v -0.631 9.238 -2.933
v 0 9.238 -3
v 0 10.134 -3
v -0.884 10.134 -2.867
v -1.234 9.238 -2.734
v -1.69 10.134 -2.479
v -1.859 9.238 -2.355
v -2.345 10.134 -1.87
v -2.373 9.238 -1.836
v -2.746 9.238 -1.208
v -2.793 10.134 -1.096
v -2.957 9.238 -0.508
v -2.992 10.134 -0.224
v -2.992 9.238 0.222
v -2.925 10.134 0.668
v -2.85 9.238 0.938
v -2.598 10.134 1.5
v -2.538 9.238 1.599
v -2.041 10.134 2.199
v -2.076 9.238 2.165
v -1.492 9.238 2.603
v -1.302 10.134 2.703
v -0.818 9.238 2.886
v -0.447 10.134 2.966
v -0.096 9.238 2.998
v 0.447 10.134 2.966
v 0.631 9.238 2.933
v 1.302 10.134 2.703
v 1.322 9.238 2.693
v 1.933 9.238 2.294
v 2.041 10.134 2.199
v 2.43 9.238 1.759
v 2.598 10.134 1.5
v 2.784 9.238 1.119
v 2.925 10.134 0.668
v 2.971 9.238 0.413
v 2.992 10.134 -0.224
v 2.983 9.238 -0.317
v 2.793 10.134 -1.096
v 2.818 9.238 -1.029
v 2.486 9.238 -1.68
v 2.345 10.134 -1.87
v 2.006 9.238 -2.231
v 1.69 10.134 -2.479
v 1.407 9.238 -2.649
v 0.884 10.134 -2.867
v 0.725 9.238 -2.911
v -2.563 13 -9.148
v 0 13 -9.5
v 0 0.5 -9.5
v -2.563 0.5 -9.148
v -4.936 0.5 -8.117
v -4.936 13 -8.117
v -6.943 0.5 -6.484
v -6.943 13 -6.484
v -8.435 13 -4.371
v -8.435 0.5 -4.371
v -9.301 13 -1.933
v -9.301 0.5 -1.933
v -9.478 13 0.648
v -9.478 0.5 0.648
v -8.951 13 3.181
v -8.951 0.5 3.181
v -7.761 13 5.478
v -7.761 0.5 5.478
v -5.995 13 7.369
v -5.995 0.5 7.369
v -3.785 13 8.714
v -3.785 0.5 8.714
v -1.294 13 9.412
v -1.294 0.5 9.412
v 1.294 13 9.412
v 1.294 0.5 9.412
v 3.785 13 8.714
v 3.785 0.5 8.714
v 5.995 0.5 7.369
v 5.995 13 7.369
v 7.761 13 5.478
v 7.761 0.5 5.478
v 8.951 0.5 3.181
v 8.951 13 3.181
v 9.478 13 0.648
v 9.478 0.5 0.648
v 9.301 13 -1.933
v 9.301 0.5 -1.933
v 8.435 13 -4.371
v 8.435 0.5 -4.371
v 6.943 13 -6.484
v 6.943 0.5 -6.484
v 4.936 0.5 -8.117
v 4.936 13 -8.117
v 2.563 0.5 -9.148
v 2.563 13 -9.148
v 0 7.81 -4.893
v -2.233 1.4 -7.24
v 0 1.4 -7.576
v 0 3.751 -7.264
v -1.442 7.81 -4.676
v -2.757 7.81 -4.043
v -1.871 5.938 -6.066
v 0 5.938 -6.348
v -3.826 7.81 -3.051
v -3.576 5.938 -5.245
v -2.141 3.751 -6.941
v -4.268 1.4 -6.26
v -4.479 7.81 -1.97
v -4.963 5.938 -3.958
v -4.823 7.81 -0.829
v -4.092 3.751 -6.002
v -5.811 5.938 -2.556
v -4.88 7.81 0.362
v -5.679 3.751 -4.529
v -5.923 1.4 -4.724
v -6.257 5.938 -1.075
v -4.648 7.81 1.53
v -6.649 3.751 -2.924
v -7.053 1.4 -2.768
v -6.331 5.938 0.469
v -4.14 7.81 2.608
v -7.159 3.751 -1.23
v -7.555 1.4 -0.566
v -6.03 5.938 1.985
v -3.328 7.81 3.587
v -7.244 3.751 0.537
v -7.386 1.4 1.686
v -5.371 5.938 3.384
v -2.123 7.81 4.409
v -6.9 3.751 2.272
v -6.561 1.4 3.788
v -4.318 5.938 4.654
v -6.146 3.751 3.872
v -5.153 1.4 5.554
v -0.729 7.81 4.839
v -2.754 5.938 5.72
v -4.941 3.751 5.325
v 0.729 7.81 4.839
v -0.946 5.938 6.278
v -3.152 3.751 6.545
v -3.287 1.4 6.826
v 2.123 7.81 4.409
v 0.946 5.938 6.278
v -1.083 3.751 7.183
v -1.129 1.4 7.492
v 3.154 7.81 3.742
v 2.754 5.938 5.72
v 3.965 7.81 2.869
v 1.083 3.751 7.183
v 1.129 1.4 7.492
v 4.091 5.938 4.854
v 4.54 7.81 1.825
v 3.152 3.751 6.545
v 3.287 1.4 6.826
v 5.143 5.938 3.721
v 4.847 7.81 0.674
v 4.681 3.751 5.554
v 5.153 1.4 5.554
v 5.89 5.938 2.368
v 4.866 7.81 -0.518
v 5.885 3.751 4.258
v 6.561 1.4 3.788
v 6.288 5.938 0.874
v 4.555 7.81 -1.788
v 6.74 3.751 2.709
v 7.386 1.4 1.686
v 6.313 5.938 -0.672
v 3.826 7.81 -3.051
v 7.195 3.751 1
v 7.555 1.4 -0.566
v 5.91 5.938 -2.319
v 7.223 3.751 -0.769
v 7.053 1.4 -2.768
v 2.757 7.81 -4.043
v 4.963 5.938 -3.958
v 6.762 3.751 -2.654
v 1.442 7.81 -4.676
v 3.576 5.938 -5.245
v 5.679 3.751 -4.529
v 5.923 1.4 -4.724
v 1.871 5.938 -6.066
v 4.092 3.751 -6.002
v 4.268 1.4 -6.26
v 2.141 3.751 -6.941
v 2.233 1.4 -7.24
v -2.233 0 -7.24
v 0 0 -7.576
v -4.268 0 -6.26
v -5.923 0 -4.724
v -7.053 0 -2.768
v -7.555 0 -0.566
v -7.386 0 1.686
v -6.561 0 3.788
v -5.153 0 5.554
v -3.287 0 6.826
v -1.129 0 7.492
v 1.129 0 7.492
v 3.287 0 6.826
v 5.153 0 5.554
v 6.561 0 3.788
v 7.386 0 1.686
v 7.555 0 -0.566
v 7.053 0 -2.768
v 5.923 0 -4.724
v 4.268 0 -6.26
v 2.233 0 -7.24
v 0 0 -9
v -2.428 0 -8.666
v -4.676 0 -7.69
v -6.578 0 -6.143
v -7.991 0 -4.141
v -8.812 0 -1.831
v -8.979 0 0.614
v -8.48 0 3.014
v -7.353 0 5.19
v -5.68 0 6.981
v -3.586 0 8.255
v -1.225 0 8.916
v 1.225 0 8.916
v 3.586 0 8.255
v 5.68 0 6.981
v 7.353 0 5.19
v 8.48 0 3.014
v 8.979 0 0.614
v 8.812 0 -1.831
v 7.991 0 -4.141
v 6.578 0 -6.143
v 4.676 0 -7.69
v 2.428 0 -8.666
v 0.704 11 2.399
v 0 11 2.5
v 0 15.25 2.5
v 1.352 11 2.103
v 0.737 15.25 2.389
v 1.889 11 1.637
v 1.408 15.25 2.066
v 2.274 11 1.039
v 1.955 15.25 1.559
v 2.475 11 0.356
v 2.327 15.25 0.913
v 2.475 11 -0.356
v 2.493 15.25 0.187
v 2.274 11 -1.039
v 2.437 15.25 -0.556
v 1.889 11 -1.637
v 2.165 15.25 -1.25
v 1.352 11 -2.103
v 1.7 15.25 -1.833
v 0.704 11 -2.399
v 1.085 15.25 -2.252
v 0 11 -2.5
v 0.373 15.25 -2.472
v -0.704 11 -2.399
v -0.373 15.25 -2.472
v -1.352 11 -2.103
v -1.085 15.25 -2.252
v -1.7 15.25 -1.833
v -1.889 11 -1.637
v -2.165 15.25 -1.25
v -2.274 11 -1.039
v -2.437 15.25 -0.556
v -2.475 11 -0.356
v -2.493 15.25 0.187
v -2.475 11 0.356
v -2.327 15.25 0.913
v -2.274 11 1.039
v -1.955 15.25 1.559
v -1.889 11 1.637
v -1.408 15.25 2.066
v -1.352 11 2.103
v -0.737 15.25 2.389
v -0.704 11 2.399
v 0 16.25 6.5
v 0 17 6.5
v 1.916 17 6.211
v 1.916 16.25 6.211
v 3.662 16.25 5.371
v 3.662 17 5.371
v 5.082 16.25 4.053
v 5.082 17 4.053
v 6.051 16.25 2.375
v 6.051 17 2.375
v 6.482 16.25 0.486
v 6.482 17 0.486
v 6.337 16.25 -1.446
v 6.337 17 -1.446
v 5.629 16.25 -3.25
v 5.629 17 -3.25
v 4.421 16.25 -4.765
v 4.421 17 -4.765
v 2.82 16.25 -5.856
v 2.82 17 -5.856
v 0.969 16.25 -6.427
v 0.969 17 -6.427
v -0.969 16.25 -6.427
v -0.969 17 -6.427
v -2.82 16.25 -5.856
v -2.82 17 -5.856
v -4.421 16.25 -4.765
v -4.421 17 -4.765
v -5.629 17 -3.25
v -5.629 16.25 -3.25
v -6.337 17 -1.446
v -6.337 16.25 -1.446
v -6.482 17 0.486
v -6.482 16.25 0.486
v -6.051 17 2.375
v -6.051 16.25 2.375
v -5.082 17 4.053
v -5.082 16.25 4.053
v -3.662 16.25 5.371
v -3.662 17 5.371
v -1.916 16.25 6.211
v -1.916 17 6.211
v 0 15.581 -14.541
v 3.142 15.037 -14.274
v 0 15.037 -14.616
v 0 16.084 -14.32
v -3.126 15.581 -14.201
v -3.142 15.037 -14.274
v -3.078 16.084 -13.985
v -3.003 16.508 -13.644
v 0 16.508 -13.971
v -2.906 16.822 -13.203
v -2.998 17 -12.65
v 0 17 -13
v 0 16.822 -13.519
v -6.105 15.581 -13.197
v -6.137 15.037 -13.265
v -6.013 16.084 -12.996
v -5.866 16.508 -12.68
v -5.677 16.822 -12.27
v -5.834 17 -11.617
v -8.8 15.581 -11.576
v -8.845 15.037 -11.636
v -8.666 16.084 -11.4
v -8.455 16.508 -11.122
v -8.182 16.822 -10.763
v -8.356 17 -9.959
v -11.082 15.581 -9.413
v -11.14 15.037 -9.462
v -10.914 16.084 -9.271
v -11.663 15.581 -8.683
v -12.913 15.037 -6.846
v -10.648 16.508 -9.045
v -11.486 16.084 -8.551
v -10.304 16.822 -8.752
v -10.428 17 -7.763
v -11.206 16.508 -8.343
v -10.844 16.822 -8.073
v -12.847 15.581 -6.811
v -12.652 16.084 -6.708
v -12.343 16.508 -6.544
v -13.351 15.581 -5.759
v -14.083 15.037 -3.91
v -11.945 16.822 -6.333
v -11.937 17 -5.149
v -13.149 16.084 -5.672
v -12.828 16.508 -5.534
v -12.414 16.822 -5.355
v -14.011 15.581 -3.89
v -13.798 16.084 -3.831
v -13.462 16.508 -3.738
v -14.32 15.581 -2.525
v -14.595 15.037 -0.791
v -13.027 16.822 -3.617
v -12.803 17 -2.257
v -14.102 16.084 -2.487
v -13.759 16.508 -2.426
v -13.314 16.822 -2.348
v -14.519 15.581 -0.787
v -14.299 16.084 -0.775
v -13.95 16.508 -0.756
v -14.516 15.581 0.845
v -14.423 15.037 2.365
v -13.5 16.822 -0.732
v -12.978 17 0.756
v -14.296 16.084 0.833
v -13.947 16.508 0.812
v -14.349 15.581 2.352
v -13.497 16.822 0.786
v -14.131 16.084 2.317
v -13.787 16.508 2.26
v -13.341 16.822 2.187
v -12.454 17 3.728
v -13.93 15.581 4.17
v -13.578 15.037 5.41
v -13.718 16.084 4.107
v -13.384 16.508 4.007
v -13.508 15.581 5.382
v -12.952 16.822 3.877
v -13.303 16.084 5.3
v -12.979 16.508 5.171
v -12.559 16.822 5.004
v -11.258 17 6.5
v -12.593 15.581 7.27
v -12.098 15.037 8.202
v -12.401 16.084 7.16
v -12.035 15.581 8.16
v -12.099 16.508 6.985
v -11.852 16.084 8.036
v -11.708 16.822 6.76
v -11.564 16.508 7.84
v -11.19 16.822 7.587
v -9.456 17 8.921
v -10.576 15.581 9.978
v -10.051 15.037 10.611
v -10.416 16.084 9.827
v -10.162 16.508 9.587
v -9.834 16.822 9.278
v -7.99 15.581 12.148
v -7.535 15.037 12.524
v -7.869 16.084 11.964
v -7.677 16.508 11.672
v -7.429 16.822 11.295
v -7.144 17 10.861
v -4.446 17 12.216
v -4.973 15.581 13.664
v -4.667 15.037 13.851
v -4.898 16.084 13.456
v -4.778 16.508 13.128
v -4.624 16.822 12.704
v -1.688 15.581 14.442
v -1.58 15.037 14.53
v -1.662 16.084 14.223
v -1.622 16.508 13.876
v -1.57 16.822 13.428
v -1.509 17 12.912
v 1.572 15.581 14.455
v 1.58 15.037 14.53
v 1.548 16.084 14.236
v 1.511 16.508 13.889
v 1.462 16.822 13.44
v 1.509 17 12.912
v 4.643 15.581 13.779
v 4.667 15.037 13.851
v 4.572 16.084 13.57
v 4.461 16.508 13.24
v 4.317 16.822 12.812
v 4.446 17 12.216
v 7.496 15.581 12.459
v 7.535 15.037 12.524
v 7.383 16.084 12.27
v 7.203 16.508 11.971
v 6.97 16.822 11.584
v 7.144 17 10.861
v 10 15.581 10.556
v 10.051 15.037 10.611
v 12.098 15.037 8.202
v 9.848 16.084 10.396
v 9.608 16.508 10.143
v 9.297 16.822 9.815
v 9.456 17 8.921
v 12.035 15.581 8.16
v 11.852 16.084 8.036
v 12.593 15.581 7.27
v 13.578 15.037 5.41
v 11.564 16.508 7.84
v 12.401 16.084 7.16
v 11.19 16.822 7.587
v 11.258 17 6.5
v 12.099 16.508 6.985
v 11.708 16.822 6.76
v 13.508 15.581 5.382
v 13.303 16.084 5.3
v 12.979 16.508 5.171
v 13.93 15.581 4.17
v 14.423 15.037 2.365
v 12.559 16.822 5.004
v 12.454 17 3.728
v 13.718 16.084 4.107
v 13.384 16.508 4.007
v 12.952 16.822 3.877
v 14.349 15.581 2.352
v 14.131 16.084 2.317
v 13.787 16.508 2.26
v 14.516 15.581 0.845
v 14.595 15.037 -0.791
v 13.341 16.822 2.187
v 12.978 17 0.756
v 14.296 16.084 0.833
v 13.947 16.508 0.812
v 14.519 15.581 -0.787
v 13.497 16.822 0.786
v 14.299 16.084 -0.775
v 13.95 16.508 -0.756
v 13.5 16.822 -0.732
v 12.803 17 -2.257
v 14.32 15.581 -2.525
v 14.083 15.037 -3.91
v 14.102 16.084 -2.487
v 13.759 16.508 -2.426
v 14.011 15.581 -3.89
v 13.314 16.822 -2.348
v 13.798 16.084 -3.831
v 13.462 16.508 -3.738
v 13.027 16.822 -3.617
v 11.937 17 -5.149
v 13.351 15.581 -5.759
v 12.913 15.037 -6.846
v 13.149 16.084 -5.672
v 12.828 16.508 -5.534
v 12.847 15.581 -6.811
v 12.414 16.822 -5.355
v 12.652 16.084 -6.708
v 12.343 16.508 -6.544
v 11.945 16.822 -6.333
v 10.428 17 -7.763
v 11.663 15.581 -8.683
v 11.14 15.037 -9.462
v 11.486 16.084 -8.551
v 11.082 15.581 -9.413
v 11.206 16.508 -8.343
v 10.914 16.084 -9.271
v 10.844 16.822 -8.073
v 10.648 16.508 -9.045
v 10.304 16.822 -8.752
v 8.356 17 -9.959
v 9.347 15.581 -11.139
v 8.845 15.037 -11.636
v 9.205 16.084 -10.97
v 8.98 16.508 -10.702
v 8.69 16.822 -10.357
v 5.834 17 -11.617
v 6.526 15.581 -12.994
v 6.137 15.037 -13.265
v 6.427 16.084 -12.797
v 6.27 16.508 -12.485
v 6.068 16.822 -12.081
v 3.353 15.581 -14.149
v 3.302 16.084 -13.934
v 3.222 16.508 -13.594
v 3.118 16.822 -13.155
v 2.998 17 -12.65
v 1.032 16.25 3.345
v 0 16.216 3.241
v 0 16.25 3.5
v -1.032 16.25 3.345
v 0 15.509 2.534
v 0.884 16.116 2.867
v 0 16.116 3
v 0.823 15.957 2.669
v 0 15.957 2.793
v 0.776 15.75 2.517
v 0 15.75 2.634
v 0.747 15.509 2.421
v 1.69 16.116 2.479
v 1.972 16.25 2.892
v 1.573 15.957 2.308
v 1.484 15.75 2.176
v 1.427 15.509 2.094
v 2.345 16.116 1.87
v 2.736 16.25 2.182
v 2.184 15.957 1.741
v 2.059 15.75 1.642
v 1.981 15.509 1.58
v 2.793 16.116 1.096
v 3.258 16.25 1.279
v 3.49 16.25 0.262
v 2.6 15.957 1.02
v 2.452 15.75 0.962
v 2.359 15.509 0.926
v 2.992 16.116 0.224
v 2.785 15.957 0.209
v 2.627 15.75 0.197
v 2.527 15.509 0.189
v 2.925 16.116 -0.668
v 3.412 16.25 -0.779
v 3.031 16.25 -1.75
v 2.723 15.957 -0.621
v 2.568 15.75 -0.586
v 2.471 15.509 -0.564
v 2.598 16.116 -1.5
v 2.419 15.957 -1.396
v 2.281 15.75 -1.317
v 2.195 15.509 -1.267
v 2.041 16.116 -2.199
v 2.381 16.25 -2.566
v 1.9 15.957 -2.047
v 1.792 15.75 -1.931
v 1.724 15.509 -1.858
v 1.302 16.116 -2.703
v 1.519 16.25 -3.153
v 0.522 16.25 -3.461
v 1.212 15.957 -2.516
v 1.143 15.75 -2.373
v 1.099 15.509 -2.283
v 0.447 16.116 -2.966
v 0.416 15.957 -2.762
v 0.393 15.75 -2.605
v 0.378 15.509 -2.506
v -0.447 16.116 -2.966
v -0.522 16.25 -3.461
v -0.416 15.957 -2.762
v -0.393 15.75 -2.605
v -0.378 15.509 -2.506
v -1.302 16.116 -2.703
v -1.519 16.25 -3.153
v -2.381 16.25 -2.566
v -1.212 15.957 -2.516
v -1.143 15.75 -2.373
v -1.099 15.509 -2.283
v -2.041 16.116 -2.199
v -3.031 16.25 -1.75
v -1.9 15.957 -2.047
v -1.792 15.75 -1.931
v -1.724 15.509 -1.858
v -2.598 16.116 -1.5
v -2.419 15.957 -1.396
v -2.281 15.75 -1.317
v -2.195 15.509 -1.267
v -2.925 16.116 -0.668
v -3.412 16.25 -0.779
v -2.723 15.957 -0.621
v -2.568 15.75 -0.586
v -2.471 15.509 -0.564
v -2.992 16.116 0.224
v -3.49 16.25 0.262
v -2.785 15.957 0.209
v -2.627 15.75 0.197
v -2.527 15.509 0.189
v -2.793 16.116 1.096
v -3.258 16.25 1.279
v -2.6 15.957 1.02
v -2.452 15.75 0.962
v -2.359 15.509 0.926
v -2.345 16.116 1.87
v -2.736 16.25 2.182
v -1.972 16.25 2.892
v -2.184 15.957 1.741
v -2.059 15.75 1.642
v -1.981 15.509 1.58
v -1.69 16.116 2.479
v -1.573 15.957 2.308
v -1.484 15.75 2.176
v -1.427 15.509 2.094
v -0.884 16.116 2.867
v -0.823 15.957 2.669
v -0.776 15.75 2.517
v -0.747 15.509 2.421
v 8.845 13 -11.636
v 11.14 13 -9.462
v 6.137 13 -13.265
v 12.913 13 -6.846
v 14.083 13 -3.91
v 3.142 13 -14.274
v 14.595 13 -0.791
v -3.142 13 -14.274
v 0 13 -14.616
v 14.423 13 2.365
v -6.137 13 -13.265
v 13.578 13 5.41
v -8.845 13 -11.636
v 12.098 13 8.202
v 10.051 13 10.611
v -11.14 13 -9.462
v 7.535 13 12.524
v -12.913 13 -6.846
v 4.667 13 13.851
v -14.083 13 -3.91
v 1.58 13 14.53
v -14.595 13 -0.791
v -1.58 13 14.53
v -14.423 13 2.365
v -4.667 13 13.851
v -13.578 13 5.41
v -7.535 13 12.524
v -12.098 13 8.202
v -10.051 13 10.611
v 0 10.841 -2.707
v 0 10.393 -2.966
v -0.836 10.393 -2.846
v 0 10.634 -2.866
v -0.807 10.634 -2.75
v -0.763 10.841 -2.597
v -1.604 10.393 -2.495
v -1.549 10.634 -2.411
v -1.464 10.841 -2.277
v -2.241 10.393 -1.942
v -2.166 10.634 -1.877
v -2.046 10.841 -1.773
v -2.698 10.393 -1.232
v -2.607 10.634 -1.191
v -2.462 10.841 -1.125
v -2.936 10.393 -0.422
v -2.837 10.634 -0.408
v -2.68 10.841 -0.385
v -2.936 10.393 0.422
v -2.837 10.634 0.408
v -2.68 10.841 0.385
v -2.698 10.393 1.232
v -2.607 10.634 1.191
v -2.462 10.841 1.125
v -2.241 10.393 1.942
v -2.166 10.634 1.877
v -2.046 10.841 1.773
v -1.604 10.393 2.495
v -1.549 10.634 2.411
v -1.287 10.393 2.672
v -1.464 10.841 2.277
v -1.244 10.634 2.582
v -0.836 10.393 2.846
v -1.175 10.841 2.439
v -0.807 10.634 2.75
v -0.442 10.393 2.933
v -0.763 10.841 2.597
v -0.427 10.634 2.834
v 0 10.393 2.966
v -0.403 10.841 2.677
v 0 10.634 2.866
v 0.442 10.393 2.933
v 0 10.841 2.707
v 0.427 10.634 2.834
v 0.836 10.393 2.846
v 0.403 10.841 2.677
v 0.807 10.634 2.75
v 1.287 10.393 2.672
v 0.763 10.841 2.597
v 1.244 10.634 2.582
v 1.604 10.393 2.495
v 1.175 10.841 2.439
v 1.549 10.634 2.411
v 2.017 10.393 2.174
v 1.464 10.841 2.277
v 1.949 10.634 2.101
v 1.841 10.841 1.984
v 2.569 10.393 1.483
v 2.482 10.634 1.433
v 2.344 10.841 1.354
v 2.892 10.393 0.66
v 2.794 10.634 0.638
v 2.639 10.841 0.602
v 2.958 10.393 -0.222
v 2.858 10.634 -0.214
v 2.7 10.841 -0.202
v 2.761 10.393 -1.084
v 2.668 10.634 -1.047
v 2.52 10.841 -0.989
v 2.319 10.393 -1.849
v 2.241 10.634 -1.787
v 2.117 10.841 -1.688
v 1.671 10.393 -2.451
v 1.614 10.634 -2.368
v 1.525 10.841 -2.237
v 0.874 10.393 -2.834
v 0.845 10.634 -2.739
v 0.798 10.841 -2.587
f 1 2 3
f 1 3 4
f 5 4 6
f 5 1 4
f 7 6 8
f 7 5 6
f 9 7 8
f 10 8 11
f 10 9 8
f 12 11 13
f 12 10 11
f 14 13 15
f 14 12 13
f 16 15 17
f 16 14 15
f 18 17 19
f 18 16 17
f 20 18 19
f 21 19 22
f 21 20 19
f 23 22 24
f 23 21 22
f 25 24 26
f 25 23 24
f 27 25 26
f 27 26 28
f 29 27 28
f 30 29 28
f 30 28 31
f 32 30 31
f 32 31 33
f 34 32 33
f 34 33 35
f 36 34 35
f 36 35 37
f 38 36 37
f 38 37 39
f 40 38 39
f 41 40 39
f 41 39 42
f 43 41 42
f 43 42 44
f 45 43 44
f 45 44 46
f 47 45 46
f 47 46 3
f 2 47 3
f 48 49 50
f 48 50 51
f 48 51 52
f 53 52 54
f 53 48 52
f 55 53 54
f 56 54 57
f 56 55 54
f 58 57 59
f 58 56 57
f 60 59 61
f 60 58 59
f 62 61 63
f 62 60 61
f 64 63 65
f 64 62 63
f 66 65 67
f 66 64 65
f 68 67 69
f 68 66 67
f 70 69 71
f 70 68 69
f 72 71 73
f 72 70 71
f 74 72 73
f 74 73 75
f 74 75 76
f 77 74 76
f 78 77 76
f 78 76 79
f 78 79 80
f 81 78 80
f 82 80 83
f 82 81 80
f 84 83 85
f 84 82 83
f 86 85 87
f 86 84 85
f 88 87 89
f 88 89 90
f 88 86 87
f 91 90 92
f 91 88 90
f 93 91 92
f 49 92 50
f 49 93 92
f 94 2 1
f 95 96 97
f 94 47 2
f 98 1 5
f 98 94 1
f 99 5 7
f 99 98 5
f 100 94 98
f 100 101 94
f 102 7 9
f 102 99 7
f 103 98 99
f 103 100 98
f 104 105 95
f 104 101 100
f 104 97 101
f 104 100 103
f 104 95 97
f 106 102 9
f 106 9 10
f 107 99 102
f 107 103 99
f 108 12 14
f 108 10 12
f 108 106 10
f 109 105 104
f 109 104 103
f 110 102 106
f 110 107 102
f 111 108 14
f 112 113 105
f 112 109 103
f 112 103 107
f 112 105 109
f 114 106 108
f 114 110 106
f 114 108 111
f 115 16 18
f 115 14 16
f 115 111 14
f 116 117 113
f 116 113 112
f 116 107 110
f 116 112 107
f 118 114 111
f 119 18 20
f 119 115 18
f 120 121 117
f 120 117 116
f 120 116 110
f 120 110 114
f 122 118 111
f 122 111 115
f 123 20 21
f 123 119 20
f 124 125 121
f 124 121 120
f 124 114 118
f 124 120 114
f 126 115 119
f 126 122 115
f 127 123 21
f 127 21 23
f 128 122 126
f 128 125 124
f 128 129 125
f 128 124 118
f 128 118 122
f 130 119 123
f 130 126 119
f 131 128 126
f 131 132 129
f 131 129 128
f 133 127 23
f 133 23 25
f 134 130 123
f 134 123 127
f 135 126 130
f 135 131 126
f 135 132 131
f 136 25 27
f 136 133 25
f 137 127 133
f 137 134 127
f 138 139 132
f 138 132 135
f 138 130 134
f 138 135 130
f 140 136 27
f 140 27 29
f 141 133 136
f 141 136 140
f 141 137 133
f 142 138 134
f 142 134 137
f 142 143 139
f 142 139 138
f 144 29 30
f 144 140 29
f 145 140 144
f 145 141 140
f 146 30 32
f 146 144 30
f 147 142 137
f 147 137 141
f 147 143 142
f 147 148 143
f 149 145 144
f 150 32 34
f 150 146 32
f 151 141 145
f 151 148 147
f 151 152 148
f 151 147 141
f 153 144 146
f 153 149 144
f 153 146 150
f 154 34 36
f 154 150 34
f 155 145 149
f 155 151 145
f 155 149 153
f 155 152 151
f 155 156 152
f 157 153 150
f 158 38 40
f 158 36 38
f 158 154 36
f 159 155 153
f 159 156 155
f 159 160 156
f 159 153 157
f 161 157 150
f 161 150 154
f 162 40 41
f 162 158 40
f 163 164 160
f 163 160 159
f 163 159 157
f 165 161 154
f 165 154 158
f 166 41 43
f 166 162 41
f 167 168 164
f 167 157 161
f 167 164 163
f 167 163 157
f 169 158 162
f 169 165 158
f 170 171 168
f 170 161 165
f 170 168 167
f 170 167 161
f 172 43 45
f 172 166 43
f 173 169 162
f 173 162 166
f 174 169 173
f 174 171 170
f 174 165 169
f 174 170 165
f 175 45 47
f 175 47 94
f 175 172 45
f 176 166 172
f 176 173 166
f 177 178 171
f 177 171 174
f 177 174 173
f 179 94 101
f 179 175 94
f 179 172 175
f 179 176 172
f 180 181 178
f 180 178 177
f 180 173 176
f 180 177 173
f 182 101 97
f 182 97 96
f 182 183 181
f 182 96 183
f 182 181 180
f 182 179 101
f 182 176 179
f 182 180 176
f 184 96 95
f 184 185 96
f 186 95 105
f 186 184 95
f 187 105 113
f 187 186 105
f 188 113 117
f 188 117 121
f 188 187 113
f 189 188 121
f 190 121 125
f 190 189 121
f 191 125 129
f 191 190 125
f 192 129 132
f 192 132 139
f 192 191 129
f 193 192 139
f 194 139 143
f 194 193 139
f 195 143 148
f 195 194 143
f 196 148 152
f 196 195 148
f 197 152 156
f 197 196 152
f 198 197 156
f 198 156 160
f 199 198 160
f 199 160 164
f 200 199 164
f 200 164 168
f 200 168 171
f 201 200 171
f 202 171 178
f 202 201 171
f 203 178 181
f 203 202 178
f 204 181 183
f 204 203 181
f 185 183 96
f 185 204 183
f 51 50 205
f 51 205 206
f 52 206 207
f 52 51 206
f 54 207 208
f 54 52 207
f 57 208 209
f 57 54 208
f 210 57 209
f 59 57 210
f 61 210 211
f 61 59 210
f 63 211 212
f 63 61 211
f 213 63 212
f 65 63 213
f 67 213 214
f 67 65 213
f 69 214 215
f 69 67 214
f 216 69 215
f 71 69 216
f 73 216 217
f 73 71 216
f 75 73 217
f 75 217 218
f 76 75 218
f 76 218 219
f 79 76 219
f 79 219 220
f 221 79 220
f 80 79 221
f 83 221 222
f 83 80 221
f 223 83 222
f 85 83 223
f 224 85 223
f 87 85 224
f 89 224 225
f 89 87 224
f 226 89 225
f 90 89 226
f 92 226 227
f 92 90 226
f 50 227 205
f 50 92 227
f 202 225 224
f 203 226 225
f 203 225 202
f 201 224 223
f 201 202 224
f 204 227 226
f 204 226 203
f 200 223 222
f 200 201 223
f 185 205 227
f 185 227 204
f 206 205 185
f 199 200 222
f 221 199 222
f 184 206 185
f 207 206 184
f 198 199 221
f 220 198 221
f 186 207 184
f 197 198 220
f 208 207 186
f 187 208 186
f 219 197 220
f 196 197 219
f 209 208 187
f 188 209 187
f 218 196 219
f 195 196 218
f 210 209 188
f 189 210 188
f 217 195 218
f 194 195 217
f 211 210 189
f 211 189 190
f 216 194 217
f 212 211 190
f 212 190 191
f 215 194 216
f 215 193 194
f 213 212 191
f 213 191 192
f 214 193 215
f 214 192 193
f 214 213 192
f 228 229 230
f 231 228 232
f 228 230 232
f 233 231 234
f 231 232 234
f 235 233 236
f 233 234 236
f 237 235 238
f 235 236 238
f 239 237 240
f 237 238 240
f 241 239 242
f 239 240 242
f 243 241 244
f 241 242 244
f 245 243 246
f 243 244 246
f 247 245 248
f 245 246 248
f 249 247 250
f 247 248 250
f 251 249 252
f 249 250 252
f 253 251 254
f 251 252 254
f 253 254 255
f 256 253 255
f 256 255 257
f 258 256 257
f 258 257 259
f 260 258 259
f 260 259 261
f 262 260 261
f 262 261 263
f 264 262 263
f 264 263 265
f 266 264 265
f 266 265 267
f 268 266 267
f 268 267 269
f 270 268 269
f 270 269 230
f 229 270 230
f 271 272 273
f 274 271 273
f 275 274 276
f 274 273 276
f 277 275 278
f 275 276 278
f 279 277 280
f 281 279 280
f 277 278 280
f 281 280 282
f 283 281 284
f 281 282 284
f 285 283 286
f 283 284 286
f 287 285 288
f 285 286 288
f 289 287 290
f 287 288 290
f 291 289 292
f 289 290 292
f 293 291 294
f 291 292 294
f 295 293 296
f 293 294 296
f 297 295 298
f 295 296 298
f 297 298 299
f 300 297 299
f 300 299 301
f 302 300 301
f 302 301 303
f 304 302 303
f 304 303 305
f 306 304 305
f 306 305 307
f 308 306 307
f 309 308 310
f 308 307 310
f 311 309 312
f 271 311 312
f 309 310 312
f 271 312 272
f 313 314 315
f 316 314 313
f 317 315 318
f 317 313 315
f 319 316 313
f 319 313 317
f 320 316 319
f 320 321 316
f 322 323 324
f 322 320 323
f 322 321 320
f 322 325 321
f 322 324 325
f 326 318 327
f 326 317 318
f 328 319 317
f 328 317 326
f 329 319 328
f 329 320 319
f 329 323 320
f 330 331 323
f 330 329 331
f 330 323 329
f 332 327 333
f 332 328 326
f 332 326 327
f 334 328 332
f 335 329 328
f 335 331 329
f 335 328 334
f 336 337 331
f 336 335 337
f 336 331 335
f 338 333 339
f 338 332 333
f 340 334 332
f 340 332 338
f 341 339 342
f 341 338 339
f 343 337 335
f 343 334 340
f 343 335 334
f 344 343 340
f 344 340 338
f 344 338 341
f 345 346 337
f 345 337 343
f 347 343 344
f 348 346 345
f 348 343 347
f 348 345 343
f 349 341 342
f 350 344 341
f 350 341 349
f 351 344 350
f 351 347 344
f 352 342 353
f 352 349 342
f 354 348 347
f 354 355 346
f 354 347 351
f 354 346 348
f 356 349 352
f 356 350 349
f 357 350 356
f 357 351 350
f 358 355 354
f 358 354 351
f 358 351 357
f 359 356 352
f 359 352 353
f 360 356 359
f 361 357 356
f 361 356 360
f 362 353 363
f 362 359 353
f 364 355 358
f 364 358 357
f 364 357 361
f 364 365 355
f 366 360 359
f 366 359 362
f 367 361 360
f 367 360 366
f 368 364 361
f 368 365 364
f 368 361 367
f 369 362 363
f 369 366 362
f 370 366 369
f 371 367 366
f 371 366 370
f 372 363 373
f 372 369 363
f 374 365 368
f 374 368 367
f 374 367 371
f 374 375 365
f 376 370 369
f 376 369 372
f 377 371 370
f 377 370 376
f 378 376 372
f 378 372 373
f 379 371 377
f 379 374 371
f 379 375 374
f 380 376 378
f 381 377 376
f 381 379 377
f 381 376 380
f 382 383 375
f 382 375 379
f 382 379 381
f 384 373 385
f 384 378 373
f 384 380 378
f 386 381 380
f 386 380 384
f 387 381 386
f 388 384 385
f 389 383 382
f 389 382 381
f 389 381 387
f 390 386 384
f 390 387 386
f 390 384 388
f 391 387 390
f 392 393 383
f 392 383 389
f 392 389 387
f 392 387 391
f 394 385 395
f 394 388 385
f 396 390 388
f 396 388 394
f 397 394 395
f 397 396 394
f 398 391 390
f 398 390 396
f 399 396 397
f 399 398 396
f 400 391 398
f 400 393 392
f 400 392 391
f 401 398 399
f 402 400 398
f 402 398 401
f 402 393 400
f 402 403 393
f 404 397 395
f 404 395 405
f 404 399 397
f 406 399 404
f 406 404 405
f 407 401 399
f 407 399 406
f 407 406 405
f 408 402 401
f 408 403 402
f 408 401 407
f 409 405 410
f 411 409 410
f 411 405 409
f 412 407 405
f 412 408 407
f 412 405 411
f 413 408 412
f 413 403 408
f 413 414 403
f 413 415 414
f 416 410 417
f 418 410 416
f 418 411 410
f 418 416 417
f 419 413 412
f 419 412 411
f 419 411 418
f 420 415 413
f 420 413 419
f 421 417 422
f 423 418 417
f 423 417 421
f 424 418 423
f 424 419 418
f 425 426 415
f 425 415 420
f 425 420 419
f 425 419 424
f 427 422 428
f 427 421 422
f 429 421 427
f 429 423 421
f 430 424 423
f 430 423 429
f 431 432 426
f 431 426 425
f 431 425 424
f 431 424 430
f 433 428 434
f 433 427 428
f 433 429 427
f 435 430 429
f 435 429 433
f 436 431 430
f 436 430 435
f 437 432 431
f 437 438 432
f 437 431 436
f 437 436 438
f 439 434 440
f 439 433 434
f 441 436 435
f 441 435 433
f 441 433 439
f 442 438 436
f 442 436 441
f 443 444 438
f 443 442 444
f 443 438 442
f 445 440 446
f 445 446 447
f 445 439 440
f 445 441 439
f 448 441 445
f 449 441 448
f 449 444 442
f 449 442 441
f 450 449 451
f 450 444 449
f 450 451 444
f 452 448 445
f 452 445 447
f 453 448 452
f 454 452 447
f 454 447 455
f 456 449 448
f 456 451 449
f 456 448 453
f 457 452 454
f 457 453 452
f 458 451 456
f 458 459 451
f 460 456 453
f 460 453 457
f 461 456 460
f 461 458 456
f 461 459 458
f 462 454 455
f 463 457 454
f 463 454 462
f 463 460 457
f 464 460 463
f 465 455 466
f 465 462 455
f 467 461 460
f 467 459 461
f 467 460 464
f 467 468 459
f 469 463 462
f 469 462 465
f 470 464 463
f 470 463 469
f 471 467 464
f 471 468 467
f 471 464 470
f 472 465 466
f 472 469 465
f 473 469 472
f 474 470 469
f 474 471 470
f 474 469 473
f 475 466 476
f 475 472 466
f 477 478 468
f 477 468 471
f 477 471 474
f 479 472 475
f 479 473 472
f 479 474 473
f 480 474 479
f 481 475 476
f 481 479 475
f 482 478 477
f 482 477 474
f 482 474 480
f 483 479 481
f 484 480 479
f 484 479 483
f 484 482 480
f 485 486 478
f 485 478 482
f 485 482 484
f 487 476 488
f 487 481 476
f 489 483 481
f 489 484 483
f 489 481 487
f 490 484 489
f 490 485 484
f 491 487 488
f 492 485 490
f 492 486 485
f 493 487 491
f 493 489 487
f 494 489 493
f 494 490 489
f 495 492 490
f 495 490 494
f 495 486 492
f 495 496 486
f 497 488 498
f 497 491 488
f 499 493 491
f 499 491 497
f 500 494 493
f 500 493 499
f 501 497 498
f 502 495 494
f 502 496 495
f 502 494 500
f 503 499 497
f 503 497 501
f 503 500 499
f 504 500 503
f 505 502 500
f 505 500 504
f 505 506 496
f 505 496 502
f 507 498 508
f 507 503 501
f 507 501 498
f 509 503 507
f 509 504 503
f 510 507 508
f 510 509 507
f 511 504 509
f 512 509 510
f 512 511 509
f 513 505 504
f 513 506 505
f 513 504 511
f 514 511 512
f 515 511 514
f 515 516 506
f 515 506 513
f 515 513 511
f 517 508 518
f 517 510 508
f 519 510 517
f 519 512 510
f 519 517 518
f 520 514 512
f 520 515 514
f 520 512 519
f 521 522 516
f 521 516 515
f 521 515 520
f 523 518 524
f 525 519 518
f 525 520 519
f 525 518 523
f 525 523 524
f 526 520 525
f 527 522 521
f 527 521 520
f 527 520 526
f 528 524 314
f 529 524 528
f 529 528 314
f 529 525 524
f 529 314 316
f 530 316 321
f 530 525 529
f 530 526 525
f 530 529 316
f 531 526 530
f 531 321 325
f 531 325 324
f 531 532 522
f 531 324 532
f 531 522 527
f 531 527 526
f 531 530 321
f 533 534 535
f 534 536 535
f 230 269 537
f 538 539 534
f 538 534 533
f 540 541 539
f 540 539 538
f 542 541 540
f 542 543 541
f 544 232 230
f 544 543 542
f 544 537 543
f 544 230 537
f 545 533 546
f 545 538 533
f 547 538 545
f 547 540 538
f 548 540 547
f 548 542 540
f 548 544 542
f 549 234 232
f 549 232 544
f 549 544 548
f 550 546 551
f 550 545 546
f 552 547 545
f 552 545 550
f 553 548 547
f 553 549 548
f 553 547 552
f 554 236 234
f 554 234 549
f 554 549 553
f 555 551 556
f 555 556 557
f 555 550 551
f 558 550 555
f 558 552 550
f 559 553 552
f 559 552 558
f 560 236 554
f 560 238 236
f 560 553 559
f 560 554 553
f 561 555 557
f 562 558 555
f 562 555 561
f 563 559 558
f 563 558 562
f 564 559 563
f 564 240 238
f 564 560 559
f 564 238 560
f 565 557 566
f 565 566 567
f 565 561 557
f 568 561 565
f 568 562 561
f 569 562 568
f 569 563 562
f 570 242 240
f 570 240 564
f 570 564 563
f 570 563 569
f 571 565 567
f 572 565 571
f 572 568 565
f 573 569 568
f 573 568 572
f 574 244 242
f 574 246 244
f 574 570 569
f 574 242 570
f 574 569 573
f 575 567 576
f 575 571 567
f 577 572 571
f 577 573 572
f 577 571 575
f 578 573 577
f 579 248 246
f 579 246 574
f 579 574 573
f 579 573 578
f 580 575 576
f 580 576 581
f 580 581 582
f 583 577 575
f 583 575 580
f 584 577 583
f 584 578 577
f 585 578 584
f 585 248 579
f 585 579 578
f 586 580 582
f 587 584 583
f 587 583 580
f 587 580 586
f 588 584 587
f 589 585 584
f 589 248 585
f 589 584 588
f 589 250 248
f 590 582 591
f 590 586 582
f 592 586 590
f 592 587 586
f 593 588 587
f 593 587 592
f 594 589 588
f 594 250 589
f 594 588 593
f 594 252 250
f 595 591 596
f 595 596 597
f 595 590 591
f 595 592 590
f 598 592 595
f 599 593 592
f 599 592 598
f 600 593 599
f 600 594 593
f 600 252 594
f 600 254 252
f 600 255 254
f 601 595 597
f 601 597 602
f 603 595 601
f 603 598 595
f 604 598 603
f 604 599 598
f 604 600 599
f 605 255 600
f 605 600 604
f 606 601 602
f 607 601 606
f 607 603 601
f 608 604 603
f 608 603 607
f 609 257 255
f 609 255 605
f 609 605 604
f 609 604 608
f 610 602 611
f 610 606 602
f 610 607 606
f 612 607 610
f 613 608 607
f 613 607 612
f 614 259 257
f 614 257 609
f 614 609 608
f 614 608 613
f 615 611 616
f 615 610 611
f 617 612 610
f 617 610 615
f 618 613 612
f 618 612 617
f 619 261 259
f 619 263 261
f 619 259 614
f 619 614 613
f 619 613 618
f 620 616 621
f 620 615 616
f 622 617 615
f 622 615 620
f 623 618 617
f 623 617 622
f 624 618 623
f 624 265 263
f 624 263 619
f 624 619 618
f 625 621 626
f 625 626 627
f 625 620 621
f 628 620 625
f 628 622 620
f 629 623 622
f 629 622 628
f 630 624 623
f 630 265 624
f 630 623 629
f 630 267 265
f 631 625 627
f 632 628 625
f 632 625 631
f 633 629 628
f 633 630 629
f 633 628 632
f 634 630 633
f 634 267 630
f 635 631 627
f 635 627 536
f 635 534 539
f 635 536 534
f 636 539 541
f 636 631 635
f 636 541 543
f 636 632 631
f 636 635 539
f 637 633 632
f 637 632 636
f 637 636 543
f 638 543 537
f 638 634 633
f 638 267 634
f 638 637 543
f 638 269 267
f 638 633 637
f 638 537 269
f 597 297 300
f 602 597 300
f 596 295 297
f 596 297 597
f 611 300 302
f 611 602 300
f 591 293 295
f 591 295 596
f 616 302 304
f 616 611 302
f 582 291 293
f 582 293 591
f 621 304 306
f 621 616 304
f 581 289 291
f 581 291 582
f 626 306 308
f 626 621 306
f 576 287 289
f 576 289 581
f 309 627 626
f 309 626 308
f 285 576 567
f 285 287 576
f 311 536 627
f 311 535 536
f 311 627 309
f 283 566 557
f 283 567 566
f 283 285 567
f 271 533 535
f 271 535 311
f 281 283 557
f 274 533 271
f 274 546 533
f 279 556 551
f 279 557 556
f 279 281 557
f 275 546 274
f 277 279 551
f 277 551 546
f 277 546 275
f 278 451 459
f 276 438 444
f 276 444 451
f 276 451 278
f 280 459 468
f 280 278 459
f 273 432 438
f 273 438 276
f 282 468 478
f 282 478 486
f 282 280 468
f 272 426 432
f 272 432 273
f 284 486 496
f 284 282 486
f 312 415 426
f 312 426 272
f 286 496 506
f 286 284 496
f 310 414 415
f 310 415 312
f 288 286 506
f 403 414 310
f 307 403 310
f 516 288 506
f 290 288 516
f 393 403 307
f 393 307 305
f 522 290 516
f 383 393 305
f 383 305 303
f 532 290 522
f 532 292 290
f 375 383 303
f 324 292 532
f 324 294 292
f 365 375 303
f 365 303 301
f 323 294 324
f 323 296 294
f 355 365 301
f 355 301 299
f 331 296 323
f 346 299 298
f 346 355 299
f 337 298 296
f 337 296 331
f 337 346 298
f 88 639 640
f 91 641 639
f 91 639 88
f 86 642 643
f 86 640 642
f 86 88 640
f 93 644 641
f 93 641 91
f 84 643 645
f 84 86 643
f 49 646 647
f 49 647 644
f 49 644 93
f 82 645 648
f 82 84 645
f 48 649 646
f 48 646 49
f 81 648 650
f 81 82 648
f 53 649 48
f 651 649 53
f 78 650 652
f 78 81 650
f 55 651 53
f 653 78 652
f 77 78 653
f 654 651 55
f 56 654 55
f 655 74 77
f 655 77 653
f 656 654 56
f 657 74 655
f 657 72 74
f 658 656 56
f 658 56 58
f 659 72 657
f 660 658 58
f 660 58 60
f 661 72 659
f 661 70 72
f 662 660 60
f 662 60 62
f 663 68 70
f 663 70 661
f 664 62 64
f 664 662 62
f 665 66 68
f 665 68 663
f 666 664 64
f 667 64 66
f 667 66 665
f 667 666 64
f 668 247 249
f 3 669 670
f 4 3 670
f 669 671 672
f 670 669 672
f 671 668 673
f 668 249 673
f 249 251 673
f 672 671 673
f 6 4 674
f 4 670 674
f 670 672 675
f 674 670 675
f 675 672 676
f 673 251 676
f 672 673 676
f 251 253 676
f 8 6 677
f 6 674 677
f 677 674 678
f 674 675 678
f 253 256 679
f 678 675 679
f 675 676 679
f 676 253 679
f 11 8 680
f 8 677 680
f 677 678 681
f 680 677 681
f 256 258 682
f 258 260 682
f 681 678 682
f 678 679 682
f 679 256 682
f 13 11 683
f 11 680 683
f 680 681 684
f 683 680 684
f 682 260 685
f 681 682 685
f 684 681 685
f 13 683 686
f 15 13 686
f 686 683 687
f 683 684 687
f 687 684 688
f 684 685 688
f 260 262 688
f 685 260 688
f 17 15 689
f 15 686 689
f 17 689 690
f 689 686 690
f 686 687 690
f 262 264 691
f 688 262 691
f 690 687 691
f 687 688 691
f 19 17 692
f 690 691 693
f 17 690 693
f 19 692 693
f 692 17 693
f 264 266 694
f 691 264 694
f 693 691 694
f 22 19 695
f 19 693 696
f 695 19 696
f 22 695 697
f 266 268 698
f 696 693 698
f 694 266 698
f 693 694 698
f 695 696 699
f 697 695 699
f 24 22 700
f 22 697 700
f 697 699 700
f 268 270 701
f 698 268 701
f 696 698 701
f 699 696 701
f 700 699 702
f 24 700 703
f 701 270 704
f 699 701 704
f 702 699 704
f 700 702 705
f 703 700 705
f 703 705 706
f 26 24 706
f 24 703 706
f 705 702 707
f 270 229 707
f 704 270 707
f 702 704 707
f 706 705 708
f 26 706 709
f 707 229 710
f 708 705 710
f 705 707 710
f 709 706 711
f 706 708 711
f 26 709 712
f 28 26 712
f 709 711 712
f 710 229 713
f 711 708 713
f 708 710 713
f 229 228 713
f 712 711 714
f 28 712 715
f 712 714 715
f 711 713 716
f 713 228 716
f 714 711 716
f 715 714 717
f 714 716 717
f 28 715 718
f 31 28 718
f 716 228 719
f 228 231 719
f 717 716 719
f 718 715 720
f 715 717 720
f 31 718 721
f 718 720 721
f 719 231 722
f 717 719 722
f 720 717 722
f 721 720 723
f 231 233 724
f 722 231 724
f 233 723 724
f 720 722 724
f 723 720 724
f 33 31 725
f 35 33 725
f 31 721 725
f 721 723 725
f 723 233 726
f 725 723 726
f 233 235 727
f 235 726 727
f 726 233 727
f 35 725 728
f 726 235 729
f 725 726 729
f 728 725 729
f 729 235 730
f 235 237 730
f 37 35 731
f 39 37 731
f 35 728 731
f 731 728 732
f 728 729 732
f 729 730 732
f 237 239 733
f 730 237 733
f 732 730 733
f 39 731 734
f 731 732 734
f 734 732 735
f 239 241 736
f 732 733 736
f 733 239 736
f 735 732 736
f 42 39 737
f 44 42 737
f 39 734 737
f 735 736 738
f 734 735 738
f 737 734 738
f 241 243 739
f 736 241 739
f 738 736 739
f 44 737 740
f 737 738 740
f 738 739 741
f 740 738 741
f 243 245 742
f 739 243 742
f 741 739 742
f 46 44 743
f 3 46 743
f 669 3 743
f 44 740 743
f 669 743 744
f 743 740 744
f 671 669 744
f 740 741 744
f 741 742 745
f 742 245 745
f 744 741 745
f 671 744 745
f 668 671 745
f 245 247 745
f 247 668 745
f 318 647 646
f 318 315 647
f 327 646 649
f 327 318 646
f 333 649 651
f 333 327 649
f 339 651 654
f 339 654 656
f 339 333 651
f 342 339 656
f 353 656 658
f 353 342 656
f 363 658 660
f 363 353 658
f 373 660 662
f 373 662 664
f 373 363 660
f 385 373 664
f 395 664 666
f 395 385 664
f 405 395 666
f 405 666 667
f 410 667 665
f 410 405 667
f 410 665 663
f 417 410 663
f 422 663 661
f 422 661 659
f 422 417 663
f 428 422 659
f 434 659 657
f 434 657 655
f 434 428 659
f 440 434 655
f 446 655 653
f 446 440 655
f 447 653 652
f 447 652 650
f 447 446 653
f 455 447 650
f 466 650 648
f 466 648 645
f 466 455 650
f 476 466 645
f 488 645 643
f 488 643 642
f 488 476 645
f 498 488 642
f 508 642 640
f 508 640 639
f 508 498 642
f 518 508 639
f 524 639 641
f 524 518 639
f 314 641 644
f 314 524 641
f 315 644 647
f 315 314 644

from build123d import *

# Parameters (mm, degrees)
SKETCH2_R          = 6.5
CUT_EXTRUDE1_DEPTH = 0.75
SKETCH3_R          = 2.5
CUT_EXTRUDE2_DEPTH = 65.75
SKETCH5_R          = 3
CUT_EXTRUDE6_DEPTH = 19
CHAMFER1_SIZE      = 0.5
FILLET1_R          = 1


with BuildPart() as part:
    # Sketch1 → Revolve1 (revolve)
    with BuildSketch(Plane.XY, mode=Mode.PRIVATE) as revolve1_sk:
        with BuildLine():
            Line((0, 17), (0, 10.286668621))
            ThreePointArc((0, 10.286668621), (5.42509601, 7.238924157), (7.576230068, 1.4))
            Line((7.576230068, 1.4), (7.576230068, 0))
            Line((7.576230068, 0), (9.5, 0))
            Line((9.5, 0), (9.5, 13))
            Line((9.5, 13), (14.616013263, 13))
            Line((14.616013263, 13), (14.616013263, 15.037207554))
            ThreePointArc((14.616013263, 15.037207554), (14.160029693, 16.308432657), (13, 17))
            Line((13, 17), (0, 17))
        make_face()
    revolve(revolve1_sk.sketch.rotate(Axis((0, 0, 0), (0, 1, 0)), 90), axis=Axis((0, 0, 0), (0, 1, 0)))

    # Sketch2 → Cut-Extrude1 (cut)
    with BuildSketch(Plane(origin=(0, 17, 0), x_dir=(1, 0, 0), z_dir=(0, 1, 0))):
        with Locations(Location((0, 0, 0), (0, 0, 270))):
            Circle(SKETCH2_R)
    extrude(amount=-CUT_EXTRUDE1_DEPTH, mode=Mode.SUBTRACT)

    # Sketch3 → Cut-Extrude2 (cut)
    with BuildSketch(Plane(origin=(0, 16.25, 0), x_dir=(1, 0, 0), z_dir=(0, 1, 0))):
        with Locations(Location((0, 0, 0), (0, 0, 270))):
            Circle(SKETCH3_R)
    extrude(amount=-CUT_EXTRUDE2_DEPTH, mode=Mode.SUBTRACT)

    # Sketch5 → Cut-Extrude6 (cut)
    with BuildSketch(Plane(origin=(0, -8, 0), x_dir=(1, 0, 0), z_dir=(0, 1, 0))):
        with Locations(Location((0, 0, 0), (0, 0, 90))):
            Circle(SKETCH5_R)
    extrude(amount=CUT_EXTRUDE6_DEPTH, mode=Mode.SUBTRACT)

    # Chamfer1
    chamfer1_edges = [part.edges().sort_by_distance(p)[0] for p in [
        (0, 0, 9.5),
    ]]
    chamfer(chamfer1_edges, length=CHAMFER1_SIZE)

    # Fillet1
    # the kernel refuses this fillet: 1 mm, written as the material it adds along each edge
    with BuildSketch(Plane(origin=(0, 11, 0), x_dir=(0, 0, -1), z_dir=(1, 0, 0))) as fillet1_piece_1:
        with BuildLine():
            CenterArc((2, -0.866025404), FILLET1_R, 0, 60)
            Line((2.5, 0), (3, 0))
            Line((3, 0), (3, -0.866025404))
        make_face()
    revolve(axis=Axis((0, 11, 0), (0, 1, 0)))
    # the kernel refuses this fillet: 1 mm, written as the material it takes off along each edge
    with BuildSketch(Plane(origin=(0, 16.25, 0), x_dir=(0, 0, 1), z_dir=(-1, 0, 0))) as fillet1_2_piece_1:
        with BuildLine():
            CenterArc((2.5 + FILLET1_R, -FILLET1_R), FILLET1_R, 90, 90)
            Line((2.5 + FILLET1_R, 0), (2.5, 0))
            Line((2.5, 0), (2.5, -FILLET1_R))
        make_face()
    revolve(axis=Axis((0, 16.25, 0), (0, 1, 0)), mode=Mode.SUBTRACT)


solid = part.part
